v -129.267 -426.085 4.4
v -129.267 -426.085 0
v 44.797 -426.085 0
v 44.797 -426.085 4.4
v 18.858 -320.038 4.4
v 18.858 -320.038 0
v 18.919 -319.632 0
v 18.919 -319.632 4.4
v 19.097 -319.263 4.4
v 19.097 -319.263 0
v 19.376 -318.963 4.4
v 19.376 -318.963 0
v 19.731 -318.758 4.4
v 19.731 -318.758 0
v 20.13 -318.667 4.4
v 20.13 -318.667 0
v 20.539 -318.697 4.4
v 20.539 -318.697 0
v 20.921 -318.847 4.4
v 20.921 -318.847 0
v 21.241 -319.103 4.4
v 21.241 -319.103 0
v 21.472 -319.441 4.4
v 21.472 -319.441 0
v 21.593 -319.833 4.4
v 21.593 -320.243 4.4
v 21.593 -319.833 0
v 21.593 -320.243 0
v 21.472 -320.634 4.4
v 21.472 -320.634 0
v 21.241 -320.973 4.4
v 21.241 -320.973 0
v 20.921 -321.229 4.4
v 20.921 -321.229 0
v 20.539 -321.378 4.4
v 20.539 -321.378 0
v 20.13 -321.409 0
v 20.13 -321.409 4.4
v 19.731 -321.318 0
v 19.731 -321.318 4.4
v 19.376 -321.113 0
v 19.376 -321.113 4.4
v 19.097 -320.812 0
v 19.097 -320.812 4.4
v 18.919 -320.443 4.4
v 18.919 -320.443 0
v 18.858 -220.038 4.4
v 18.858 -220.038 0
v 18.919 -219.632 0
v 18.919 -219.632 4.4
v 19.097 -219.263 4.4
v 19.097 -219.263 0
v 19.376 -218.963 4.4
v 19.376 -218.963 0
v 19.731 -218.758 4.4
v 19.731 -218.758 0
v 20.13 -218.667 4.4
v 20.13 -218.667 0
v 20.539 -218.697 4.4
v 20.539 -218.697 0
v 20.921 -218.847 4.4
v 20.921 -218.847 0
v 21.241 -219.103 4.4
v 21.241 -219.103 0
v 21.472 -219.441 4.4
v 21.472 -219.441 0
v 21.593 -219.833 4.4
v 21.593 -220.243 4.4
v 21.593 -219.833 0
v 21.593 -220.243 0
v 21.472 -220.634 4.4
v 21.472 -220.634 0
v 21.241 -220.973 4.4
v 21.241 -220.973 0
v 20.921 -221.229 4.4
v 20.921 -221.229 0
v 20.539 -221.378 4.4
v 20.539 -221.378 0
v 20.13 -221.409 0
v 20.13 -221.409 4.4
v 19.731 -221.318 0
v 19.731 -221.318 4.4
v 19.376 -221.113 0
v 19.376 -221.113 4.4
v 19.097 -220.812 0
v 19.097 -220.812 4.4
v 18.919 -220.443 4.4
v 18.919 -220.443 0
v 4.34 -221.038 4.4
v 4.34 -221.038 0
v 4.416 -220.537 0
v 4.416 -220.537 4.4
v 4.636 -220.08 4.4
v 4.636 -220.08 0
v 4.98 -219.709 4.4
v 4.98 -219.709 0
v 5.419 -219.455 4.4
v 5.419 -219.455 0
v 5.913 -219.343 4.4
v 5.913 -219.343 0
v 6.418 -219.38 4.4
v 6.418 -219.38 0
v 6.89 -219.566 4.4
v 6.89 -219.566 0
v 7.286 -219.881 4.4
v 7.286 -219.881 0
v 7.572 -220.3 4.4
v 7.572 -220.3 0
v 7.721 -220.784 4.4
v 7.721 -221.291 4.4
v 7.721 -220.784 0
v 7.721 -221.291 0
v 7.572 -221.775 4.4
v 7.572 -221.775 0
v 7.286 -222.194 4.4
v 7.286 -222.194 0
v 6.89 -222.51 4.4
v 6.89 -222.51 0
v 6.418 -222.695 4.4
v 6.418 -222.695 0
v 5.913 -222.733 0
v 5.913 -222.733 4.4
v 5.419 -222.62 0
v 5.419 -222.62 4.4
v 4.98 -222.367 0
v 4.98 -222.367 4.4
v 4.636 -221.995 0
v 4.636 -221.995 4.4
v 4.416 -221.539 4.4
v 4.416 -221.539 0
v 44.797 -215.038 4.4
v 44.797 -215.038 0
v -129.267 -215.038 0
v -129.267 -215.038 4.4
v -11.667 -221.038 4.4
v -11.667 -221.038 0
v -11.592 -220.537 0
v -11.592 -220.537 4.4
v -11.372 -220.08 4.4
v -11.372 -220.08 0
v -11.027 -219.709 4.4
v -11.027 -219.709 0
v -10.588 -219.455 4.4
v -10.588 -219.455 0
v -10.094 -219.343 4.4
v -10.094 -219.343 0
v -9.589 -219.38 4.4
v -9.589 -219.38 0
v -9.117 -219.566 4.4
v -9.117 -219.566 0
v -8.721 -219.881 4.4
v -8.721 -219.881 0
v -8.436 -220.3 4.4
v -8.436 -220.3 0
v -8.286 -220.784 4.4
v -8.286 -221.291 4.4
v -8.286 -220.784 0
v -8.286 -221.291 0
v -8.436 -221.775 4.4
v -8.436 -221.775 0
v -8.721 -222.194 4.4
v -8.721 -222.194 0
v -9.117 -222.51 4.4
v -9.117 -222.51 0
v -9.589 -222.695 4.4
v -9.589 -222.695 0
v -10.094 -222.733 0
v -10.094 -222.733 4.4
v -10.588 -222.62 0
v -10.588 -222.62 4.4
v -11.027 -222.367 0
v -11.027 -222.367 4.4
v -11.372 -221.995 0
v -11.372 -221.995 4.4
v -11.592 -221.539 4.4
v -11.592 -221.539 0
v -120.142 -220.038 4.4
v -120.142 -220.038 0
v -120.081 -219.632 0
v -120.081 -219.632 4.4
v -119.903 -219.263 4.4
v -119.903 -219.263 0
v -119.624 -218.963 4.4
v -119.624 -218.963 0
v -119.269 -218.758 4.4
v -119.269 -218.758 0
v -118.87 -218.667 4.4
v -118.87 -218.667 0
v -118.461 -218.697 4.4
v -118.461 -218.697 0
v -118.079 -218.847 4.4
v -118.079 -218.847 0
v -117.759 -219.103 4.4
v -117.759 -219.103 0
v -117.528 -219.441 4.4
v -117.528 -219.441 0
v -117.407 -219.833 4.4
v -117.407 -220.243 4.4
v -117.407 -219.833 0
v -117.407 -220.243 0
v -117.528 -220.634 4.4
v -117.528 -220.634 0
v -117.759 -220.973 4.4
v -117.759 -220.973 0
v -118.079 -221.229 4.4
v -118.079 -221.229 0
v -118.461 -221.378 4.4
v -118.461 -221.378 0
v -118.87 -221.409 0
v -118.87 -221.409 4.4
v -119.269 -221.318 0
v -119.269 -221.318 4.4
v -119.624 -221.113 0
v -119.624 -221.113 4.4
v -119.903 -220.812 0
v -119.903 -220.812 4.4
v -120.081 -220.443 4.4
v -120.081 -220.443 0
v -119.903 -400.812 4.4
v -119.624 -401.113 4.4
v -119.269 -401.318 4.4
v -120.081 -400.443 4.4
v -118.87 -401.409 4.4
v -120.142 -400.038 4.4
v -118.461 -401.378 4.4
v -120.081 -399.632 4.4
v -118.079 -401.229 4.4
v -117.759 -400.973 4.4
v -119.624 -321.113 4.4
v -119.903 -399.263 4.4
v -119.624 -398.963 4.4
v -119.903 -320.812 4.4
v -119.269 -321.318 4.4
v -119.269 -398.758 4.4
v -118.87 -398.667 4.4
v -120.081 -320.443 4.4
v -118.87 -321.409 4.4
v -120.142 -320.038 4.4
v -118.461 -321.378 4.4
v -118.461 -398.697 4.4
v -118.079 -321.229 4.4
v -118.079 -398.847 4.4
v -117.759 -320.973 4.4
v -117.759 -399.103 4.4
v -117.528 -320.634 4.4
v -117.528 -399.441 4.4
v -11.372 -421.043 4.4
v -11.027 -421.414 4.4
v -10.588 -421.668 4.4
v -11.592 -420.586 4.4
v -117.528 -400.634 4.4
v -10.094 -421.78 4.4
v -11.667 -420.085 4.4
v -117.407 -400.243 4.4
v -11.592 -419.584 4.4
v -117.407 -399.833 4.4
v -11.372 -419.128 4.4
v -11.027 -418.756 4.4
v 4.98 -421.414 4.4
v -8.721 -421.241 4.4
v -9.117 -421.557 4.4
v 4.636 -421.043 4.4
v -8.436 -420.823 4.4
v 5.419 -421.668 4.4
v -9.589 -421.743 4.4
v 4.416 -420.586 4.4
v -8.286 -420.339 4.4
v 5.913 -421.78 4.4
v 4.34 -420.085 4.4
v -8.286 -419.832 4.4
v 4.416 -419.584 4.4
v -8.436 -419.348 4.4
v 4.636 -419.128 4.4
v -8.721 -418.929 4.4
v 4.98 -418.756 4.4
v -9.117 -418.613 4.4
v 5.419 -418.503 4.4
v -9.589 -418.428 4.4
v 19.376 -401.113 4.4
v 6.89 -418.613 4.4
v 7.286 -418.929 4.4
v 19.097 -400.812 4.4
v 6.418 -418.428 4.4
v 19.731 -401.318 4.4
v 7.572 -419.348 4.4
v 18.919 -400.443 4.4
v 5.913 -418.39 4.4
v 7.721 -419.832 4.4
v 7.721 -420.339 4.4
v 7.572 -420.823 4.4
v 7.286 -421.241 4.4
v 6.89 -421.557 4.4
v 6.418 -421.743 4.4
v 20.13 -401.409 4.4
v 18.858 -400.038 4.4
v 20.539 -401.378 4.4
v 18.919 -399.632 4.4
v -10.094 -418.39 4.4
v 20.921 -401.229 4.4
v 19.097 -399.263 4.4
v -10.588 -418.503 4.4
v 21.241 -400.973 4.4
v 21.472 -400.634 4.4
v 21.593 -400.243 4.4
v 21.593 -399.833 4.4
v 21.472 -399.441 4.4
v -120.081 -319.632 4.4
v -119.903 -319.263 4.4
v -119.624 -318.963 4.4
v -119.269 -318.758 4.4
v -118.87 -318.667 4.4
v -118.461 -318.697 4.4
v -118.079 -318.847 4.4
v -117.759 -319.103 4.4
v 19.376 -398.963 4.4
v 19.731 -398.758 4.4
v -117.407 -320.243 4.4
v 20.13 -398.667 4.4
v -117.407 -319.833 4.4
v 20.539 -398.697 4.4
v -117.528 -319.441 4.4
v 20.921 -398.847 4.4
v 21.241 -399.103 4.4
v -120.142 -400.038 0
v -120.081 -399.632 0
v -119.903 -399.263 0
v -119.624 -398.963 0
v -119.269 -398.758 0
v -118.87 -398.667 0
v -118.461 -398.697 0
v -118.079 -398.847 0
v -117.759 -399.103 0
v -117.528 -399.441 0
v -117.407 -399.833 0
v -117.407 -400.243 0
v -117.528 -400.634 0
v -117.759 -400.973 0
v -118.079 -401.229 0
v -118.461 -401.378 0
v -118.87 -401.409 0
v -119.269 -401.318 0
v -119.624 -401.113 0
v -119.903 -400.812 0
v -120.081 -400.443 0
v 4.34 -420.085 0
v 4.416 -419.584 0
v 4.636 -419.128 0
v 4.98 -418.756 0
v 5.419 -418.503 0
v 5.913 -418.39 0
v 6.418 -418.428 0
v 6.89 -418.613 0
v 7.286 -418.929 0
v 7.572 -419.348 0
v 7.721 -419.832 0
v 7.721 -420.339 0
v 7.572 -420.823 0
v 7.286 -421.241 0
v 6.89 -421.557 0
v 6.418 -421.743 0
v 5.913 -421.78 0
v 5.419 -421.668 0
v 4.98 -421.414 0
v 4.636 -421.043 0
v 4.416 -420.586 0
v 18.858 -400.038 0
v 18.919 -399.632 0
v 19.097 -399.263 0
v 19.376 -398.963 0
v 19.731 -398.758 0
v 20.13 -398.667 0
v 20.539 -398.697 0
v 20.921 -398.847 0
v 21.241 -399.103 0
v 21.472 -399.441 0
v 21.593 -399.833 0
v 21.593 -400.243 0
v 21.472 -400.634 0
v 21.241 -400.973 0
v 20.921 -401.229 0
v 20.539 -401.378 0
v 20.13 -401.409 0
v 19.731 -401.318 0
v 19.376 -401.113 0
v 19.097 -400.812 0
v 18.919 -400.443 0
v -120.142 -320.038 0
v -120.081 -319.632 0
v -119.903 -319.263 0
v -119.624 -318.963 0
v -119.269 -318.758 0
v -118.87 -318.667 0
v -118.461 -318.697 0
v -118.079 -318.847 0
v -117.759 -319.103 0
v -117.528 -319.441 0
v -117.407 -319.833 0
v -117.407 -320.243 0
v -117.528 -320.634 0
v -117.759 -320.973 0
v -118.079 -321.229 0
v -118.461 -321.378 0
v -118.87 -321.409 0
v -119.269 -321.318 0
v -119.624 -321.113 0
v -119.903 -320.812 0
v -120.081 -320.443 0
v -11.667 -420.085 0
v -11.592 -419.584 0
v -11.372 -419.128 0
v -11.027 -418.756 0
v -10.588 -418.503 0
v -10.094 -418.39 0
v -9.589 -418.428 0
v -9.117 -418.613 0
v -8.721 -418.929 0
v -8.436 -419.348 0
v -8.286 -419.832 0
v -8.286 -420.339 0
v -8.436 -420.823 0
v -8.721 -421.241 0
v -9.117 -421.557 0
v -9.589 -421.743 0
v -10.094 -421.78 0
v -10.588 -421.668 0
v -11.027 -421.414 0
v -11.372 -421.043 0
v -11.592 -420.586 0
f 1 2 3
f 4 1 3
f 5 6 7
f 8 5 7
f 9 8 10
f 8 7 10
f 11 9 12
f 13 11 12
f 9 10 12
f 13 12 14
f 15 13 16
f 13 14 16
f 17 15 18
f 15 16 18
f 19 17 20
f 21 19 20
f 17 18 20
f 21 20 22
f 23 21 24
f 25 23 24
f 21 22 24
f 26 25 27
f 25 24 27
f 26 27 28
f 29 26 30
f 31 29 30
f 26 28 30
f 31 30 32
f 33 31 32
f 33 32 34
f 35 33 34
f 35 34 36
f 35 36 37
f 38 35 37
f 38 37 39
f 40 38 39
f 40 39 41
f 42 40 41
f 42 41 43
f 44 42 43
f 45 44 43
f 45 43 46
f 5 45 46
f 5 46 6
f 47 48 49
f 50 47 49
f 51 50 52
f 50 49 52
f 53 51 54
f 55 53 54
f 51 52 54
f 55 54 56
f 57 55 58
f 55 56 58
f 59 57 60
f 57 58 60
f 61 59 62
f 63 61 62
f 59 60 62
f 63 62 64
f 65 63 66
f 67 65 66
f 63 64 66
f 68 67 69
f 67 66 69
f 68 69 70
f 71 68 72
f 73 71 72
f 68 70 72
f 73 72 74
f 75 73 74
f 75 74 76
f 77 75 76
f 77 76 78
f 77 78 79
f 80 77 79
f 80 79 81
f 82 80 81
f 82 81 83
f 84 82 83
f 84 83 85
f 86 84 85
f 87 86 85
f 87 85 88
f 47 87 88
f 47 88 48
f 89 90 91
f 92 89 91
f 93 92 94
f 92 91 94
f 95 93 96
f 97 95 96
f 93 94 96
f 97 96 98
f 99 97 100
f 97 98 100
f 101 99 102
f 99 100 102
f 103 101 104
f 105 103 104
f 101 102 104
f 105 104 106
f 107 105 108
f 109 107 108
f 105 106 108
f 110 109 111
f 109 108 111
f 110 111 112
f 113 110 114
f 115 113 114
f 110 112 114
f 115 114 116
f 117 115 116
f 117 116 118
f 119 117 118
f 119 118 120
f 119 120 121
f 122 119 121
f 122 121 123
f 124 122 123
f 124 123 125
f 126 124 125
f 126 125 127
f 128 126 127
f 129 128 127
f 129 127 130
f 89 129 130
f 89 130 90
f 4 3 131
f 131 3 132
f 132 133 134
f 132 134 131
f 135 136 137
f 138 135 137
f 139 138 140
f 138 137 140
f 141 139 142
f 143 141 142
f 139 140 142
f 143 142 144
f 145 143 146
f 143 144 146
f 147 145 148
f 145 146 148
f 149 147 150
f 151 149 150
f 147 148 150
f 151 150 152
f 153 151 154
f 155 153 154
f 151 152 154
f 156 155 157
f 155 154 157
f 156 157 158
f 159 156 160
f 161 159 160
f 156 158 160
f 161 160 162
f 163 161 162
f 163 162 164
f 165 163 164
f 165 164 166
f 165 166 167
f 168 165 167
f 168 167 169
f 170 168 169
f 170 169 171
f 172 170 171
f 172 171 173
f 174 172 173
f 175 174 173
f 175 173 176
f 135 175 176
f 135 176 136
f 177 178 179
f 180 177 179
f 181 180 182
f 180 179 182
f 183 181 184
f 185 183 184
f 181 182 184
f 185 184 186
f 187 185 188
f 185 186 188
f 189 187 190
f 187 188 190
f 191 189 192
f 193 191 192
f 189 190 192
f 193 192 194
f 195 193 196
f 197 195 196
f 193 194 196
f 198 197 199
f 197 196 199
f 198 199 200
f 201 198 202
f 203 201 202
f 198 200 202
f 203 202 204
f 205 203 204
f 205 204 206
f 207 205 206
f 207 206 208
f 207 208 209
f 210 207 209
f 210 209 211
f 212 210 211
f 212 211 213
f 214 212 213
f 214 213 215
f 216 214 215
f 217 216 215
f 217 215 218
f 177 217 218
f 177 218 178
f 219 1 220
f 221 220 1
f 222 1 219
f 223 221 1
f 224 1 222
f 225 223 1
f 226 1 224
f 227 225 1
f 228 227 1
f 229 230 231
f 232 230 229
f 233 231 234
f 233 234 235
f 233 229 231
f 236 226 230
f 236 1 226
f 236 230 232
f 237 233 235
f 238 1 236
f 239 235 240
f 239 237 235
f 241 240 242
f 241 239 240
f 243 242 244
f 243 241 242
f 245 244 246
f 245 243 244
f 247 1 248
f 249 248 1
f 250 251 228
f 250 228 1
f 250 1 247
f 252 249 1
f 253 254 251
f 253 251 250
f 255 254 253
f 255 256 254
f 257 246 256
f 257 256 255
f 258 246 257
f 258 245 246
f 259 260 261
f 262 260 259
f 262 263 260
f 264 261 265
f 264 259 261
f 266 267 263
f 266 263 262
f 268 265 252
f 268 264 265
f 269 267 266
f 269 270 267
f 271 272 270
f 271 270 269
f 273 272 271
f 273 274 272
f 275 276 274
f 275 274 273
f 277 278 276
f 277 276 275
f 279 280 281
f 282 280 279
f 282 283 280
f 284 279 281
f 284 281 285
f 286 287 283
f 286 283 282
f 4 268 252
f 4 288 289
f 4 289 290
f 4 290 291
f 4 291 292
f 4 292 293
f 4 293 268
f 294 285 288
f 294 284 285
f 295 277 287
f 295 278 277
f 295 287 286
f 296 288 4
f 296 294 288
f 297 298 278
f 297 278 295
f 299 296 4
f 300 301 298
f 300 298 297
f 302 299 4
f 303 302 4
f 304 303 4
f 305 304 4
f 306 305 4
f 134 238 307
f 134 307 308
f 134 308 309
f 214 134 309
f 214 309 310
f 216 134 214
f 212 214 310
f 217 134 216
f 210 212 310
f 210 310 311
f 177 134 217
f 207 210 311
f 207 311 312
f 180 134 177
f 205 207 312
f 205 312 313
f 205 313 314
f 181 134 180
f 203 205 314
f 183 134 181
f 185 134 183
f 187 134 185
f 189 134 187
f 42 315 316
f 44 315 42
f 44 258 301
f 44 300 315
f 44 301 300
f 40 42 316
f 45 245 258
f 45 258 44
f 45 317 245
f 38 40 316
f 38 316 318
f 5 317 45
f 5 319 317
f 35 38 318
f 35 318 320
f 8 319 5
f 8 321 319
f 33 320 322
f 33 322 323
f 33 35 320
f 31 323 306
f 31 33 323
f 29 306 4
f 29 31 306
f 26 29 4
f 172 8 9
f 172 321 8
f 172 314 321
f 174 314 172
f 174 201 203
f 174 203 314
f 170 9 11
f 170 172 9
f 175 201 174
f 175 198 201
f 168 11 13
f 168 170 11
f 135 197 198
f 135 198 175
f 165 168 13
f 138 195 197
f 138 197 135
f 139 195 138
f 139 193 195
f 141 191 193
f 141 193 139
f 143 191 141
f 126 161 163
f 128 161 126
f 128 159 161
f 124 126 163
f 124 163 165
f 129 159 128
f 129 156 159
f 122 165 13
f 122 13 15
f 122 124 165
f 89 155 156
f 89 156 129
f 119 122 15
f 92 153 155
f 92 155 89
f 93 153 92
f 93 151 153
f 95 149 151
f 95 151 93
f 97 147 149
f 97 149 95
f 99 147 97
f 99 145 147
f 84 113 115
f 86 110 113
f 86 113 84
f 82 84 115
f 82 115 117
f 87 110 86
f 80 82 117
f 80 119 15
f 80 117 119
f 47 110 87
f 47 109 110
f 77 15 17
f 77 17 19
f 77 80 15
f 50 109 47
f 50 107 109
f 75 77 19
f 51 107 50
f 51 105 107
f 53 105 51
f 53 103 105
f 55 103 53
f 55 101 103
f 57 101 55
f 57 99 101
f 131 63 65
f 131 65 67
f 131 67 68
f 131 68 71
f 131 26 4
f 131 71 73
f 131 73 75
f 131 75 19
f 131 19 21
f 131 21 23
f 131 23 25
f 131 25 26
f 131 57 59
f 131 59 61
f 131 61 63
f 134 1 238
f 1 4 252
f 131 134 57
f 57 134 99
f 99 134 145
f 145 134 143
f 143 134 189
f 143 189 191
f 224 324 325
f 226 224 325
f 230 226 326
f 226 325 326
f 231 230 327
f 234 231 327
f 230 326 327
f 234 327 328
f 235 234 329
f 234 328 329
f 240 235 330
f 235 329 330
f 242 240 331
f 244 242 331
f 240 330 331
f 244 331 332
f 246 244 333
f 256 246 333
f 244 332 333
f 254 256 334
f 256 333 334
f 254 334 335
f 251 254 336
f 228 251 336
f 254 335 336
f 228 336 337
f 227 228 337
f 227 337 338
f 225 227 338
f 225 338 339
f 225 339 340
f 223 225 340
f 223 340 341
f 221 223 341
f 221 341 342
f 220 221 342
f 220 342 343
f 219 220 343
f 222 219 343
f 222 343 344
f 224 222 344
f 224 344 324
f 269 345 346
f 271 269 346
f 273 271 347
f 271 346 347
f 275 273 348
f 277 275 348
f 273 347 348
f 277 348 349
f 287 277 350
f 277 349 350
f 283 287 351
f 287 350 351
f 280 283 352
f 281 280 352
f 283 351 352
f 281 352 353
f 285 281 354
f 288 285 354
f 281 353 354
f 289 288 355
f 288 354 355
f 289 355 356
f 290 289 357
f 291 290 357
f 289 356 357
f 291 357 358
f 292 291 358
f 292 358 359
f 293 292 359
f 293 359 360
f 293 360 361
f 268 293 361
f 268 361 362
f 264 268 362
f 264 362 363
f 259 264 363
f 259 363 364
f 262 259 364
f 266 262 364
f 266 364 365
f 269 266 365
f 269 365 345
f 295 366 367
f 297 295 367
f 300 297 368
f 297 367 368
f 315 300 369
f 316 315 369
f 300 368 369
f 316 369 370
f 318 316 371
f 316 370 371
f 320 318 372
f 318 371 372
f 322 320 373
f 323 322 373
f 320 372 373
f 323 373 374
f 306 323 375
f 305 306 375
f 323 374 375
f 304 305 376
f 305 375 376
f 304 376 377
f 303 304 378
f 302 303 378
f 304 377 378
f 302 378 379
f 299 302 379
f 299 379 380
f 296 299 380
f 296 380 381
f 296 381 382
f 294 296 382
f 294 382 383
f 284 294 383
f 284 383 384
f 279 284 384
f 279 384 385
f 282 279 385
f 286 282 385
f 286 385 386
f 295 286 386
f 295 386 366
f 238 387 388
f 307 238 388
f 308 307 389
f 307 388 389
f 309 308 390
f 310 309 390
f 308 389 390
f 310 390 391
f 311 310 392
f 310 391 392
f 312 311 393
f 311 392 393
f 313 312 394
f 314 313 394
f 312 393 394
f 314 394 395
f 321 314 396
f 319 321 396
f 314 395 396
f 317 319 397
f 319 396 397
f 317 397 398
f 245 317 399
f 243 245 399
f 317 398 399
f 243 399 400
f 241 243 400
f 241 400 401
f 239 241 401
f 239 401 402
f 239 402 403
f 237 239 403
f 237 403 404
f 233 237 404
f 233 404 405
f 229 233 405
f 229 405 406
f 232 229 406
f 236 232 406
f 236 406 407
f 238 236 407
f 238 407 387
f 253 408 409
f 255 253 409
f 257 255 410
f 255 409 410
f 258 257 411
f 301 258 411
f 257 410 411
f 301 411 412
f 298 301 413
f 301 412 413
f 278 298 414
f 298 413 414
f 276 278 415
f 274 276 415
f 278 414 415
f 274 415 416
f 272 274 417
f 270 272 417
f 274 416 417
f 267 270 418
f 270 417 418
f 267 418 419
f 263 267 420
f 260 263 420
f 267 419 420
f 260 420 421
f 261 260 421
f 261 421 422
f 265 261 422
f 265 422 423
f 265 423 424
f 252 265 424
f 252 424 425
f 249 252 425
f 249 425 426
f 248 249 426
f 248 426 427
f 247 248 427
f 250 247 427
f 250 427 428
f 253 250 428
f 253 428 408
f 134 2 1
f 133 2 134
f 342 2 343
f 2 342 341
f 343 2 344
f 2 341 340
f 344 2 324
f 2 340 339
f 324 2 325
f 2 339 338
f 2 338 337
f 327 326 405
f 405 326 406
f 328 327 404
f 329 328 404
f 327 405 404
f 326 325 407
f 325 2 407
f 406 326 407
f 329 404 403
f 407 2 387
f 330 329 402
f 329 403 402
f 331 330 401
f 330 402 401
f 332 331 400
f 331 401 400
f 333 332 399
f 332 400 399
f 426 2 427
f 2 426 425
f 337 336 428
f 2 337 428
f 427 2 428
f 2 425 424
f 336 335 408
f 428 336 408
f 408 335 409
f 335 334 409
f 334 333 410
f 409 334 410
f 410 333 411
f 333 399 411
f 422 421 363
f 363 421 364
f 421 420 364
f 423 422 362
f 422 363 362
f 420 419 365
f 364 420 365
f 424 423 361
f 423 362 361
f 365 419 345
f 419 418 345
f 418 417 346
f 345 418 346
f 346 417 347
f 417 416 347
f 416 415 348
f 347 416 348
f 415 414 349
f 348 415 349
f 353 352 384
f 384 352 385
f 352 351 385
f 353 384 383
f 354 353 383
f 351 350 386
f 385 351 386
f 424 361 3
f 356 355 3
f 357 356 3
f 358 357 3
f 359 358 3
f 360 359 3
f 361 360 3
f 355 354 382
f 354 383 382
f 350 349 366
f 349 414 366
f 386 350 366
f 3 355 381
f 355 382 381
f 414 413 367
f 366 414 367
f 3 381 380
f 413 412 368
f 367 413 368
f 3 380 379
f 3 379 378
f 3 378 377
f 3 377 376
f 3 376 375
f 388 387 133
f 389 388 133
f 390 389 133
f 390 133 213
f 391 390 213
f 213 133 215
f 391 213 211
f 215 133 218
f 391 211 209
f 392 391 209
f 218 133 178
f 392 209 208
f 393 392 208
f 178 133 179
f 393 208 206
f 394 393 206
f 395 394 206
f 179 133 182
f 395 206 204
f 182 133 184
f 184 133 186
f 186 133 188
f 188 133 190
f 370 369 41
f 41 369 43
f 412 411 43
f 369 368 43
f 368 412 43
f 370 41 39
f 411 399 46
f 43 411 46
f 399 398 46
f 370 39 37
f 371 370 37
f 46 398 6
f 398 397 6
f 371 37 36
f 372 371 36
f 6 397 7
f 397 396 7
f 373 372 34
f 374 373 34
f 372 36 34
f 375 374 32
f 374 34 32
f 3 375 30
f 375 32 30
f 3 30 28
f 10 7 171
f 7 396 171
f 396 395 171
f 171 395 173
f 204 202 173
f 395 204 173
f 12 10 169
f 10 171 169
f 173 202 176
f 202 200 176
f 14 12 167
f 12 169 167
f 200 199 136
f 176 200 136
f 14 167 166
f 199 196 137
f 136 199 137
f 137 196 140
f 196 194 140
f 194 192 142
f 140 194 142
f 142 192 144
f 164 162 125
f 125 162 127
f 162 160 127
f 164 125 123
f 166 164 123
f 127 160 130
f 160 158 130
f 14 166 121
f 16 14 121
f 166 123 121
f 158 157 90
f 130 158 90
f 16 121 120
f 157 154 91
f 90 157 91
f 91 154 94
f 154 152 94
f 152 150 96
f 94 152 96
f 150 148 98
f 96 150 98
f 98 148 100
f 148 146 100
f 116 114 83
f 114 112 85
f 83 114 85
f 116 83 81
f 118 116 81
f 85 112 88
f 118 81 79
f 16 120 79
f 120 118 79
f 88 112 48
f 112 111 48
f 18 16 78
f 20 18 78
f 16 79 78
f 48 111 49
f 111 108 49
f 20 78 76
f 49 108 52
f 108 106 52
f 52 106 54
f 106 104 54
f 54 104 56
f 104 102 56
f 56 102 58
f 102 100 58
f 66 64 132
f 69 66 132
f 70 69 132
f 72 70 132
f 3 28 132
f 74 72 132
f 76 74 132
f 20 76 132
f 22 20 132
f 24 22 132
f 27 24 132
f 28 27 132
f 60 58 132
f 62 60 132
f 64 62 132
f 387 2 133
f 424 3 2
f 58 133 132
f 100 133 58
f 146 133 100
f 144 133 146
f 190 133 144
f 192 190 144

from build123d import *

# Parameters (mm, degrees)
SKETCH1_W               = 174.064160833
SKETCH1_H               = 211.04739762
BOSS_EXTRUDE1_DEPTH     = 4.4
TAP_DRILL_FOR_M3_TAP1_D = 2.75
M3_CLEARANCE_HOLE1_D    = 3.4


with BuildPart() as part:
    # Sketch1 → Boss-Extrude1 (new body)
    with BuildSketch(Plane.XY):
        with Locations((-42.234880602, -320.561484724)):
            Rectangle(SKETCH1_W, SKETCH1_H)
    extrude(amount=BOSS_EXTRUDE1_DEPTH)

    # Tap Drill for M3 Tap1 (through all)
    with Locations(Plane.XY.offset(4.4)):
        with Locations((-118.766961018, -220.037785914), (20.233038982, -220.037785914), (-118.766961018, -320.037785914), (20.233038982, -320.037785914), (20.233038982, -400.037785914), (-118.766961018, -400.037785914)):
            Hole(TAP_DRILL_FOR_M3_TAP1_D / 2)

    # M3 Clearance Hole1 (through all)
    with Locations(Plane.XY.offset(4.4)):
        with Locations((-9.96740718, -420.085183534), (6.04019282, -420.085183534), (-9.96740718, -221.037785914), (6.04019282, -221.037785914)):
            Hole(M3_CLEARANCE_HOLE1_D / 2)


solid = part.part
